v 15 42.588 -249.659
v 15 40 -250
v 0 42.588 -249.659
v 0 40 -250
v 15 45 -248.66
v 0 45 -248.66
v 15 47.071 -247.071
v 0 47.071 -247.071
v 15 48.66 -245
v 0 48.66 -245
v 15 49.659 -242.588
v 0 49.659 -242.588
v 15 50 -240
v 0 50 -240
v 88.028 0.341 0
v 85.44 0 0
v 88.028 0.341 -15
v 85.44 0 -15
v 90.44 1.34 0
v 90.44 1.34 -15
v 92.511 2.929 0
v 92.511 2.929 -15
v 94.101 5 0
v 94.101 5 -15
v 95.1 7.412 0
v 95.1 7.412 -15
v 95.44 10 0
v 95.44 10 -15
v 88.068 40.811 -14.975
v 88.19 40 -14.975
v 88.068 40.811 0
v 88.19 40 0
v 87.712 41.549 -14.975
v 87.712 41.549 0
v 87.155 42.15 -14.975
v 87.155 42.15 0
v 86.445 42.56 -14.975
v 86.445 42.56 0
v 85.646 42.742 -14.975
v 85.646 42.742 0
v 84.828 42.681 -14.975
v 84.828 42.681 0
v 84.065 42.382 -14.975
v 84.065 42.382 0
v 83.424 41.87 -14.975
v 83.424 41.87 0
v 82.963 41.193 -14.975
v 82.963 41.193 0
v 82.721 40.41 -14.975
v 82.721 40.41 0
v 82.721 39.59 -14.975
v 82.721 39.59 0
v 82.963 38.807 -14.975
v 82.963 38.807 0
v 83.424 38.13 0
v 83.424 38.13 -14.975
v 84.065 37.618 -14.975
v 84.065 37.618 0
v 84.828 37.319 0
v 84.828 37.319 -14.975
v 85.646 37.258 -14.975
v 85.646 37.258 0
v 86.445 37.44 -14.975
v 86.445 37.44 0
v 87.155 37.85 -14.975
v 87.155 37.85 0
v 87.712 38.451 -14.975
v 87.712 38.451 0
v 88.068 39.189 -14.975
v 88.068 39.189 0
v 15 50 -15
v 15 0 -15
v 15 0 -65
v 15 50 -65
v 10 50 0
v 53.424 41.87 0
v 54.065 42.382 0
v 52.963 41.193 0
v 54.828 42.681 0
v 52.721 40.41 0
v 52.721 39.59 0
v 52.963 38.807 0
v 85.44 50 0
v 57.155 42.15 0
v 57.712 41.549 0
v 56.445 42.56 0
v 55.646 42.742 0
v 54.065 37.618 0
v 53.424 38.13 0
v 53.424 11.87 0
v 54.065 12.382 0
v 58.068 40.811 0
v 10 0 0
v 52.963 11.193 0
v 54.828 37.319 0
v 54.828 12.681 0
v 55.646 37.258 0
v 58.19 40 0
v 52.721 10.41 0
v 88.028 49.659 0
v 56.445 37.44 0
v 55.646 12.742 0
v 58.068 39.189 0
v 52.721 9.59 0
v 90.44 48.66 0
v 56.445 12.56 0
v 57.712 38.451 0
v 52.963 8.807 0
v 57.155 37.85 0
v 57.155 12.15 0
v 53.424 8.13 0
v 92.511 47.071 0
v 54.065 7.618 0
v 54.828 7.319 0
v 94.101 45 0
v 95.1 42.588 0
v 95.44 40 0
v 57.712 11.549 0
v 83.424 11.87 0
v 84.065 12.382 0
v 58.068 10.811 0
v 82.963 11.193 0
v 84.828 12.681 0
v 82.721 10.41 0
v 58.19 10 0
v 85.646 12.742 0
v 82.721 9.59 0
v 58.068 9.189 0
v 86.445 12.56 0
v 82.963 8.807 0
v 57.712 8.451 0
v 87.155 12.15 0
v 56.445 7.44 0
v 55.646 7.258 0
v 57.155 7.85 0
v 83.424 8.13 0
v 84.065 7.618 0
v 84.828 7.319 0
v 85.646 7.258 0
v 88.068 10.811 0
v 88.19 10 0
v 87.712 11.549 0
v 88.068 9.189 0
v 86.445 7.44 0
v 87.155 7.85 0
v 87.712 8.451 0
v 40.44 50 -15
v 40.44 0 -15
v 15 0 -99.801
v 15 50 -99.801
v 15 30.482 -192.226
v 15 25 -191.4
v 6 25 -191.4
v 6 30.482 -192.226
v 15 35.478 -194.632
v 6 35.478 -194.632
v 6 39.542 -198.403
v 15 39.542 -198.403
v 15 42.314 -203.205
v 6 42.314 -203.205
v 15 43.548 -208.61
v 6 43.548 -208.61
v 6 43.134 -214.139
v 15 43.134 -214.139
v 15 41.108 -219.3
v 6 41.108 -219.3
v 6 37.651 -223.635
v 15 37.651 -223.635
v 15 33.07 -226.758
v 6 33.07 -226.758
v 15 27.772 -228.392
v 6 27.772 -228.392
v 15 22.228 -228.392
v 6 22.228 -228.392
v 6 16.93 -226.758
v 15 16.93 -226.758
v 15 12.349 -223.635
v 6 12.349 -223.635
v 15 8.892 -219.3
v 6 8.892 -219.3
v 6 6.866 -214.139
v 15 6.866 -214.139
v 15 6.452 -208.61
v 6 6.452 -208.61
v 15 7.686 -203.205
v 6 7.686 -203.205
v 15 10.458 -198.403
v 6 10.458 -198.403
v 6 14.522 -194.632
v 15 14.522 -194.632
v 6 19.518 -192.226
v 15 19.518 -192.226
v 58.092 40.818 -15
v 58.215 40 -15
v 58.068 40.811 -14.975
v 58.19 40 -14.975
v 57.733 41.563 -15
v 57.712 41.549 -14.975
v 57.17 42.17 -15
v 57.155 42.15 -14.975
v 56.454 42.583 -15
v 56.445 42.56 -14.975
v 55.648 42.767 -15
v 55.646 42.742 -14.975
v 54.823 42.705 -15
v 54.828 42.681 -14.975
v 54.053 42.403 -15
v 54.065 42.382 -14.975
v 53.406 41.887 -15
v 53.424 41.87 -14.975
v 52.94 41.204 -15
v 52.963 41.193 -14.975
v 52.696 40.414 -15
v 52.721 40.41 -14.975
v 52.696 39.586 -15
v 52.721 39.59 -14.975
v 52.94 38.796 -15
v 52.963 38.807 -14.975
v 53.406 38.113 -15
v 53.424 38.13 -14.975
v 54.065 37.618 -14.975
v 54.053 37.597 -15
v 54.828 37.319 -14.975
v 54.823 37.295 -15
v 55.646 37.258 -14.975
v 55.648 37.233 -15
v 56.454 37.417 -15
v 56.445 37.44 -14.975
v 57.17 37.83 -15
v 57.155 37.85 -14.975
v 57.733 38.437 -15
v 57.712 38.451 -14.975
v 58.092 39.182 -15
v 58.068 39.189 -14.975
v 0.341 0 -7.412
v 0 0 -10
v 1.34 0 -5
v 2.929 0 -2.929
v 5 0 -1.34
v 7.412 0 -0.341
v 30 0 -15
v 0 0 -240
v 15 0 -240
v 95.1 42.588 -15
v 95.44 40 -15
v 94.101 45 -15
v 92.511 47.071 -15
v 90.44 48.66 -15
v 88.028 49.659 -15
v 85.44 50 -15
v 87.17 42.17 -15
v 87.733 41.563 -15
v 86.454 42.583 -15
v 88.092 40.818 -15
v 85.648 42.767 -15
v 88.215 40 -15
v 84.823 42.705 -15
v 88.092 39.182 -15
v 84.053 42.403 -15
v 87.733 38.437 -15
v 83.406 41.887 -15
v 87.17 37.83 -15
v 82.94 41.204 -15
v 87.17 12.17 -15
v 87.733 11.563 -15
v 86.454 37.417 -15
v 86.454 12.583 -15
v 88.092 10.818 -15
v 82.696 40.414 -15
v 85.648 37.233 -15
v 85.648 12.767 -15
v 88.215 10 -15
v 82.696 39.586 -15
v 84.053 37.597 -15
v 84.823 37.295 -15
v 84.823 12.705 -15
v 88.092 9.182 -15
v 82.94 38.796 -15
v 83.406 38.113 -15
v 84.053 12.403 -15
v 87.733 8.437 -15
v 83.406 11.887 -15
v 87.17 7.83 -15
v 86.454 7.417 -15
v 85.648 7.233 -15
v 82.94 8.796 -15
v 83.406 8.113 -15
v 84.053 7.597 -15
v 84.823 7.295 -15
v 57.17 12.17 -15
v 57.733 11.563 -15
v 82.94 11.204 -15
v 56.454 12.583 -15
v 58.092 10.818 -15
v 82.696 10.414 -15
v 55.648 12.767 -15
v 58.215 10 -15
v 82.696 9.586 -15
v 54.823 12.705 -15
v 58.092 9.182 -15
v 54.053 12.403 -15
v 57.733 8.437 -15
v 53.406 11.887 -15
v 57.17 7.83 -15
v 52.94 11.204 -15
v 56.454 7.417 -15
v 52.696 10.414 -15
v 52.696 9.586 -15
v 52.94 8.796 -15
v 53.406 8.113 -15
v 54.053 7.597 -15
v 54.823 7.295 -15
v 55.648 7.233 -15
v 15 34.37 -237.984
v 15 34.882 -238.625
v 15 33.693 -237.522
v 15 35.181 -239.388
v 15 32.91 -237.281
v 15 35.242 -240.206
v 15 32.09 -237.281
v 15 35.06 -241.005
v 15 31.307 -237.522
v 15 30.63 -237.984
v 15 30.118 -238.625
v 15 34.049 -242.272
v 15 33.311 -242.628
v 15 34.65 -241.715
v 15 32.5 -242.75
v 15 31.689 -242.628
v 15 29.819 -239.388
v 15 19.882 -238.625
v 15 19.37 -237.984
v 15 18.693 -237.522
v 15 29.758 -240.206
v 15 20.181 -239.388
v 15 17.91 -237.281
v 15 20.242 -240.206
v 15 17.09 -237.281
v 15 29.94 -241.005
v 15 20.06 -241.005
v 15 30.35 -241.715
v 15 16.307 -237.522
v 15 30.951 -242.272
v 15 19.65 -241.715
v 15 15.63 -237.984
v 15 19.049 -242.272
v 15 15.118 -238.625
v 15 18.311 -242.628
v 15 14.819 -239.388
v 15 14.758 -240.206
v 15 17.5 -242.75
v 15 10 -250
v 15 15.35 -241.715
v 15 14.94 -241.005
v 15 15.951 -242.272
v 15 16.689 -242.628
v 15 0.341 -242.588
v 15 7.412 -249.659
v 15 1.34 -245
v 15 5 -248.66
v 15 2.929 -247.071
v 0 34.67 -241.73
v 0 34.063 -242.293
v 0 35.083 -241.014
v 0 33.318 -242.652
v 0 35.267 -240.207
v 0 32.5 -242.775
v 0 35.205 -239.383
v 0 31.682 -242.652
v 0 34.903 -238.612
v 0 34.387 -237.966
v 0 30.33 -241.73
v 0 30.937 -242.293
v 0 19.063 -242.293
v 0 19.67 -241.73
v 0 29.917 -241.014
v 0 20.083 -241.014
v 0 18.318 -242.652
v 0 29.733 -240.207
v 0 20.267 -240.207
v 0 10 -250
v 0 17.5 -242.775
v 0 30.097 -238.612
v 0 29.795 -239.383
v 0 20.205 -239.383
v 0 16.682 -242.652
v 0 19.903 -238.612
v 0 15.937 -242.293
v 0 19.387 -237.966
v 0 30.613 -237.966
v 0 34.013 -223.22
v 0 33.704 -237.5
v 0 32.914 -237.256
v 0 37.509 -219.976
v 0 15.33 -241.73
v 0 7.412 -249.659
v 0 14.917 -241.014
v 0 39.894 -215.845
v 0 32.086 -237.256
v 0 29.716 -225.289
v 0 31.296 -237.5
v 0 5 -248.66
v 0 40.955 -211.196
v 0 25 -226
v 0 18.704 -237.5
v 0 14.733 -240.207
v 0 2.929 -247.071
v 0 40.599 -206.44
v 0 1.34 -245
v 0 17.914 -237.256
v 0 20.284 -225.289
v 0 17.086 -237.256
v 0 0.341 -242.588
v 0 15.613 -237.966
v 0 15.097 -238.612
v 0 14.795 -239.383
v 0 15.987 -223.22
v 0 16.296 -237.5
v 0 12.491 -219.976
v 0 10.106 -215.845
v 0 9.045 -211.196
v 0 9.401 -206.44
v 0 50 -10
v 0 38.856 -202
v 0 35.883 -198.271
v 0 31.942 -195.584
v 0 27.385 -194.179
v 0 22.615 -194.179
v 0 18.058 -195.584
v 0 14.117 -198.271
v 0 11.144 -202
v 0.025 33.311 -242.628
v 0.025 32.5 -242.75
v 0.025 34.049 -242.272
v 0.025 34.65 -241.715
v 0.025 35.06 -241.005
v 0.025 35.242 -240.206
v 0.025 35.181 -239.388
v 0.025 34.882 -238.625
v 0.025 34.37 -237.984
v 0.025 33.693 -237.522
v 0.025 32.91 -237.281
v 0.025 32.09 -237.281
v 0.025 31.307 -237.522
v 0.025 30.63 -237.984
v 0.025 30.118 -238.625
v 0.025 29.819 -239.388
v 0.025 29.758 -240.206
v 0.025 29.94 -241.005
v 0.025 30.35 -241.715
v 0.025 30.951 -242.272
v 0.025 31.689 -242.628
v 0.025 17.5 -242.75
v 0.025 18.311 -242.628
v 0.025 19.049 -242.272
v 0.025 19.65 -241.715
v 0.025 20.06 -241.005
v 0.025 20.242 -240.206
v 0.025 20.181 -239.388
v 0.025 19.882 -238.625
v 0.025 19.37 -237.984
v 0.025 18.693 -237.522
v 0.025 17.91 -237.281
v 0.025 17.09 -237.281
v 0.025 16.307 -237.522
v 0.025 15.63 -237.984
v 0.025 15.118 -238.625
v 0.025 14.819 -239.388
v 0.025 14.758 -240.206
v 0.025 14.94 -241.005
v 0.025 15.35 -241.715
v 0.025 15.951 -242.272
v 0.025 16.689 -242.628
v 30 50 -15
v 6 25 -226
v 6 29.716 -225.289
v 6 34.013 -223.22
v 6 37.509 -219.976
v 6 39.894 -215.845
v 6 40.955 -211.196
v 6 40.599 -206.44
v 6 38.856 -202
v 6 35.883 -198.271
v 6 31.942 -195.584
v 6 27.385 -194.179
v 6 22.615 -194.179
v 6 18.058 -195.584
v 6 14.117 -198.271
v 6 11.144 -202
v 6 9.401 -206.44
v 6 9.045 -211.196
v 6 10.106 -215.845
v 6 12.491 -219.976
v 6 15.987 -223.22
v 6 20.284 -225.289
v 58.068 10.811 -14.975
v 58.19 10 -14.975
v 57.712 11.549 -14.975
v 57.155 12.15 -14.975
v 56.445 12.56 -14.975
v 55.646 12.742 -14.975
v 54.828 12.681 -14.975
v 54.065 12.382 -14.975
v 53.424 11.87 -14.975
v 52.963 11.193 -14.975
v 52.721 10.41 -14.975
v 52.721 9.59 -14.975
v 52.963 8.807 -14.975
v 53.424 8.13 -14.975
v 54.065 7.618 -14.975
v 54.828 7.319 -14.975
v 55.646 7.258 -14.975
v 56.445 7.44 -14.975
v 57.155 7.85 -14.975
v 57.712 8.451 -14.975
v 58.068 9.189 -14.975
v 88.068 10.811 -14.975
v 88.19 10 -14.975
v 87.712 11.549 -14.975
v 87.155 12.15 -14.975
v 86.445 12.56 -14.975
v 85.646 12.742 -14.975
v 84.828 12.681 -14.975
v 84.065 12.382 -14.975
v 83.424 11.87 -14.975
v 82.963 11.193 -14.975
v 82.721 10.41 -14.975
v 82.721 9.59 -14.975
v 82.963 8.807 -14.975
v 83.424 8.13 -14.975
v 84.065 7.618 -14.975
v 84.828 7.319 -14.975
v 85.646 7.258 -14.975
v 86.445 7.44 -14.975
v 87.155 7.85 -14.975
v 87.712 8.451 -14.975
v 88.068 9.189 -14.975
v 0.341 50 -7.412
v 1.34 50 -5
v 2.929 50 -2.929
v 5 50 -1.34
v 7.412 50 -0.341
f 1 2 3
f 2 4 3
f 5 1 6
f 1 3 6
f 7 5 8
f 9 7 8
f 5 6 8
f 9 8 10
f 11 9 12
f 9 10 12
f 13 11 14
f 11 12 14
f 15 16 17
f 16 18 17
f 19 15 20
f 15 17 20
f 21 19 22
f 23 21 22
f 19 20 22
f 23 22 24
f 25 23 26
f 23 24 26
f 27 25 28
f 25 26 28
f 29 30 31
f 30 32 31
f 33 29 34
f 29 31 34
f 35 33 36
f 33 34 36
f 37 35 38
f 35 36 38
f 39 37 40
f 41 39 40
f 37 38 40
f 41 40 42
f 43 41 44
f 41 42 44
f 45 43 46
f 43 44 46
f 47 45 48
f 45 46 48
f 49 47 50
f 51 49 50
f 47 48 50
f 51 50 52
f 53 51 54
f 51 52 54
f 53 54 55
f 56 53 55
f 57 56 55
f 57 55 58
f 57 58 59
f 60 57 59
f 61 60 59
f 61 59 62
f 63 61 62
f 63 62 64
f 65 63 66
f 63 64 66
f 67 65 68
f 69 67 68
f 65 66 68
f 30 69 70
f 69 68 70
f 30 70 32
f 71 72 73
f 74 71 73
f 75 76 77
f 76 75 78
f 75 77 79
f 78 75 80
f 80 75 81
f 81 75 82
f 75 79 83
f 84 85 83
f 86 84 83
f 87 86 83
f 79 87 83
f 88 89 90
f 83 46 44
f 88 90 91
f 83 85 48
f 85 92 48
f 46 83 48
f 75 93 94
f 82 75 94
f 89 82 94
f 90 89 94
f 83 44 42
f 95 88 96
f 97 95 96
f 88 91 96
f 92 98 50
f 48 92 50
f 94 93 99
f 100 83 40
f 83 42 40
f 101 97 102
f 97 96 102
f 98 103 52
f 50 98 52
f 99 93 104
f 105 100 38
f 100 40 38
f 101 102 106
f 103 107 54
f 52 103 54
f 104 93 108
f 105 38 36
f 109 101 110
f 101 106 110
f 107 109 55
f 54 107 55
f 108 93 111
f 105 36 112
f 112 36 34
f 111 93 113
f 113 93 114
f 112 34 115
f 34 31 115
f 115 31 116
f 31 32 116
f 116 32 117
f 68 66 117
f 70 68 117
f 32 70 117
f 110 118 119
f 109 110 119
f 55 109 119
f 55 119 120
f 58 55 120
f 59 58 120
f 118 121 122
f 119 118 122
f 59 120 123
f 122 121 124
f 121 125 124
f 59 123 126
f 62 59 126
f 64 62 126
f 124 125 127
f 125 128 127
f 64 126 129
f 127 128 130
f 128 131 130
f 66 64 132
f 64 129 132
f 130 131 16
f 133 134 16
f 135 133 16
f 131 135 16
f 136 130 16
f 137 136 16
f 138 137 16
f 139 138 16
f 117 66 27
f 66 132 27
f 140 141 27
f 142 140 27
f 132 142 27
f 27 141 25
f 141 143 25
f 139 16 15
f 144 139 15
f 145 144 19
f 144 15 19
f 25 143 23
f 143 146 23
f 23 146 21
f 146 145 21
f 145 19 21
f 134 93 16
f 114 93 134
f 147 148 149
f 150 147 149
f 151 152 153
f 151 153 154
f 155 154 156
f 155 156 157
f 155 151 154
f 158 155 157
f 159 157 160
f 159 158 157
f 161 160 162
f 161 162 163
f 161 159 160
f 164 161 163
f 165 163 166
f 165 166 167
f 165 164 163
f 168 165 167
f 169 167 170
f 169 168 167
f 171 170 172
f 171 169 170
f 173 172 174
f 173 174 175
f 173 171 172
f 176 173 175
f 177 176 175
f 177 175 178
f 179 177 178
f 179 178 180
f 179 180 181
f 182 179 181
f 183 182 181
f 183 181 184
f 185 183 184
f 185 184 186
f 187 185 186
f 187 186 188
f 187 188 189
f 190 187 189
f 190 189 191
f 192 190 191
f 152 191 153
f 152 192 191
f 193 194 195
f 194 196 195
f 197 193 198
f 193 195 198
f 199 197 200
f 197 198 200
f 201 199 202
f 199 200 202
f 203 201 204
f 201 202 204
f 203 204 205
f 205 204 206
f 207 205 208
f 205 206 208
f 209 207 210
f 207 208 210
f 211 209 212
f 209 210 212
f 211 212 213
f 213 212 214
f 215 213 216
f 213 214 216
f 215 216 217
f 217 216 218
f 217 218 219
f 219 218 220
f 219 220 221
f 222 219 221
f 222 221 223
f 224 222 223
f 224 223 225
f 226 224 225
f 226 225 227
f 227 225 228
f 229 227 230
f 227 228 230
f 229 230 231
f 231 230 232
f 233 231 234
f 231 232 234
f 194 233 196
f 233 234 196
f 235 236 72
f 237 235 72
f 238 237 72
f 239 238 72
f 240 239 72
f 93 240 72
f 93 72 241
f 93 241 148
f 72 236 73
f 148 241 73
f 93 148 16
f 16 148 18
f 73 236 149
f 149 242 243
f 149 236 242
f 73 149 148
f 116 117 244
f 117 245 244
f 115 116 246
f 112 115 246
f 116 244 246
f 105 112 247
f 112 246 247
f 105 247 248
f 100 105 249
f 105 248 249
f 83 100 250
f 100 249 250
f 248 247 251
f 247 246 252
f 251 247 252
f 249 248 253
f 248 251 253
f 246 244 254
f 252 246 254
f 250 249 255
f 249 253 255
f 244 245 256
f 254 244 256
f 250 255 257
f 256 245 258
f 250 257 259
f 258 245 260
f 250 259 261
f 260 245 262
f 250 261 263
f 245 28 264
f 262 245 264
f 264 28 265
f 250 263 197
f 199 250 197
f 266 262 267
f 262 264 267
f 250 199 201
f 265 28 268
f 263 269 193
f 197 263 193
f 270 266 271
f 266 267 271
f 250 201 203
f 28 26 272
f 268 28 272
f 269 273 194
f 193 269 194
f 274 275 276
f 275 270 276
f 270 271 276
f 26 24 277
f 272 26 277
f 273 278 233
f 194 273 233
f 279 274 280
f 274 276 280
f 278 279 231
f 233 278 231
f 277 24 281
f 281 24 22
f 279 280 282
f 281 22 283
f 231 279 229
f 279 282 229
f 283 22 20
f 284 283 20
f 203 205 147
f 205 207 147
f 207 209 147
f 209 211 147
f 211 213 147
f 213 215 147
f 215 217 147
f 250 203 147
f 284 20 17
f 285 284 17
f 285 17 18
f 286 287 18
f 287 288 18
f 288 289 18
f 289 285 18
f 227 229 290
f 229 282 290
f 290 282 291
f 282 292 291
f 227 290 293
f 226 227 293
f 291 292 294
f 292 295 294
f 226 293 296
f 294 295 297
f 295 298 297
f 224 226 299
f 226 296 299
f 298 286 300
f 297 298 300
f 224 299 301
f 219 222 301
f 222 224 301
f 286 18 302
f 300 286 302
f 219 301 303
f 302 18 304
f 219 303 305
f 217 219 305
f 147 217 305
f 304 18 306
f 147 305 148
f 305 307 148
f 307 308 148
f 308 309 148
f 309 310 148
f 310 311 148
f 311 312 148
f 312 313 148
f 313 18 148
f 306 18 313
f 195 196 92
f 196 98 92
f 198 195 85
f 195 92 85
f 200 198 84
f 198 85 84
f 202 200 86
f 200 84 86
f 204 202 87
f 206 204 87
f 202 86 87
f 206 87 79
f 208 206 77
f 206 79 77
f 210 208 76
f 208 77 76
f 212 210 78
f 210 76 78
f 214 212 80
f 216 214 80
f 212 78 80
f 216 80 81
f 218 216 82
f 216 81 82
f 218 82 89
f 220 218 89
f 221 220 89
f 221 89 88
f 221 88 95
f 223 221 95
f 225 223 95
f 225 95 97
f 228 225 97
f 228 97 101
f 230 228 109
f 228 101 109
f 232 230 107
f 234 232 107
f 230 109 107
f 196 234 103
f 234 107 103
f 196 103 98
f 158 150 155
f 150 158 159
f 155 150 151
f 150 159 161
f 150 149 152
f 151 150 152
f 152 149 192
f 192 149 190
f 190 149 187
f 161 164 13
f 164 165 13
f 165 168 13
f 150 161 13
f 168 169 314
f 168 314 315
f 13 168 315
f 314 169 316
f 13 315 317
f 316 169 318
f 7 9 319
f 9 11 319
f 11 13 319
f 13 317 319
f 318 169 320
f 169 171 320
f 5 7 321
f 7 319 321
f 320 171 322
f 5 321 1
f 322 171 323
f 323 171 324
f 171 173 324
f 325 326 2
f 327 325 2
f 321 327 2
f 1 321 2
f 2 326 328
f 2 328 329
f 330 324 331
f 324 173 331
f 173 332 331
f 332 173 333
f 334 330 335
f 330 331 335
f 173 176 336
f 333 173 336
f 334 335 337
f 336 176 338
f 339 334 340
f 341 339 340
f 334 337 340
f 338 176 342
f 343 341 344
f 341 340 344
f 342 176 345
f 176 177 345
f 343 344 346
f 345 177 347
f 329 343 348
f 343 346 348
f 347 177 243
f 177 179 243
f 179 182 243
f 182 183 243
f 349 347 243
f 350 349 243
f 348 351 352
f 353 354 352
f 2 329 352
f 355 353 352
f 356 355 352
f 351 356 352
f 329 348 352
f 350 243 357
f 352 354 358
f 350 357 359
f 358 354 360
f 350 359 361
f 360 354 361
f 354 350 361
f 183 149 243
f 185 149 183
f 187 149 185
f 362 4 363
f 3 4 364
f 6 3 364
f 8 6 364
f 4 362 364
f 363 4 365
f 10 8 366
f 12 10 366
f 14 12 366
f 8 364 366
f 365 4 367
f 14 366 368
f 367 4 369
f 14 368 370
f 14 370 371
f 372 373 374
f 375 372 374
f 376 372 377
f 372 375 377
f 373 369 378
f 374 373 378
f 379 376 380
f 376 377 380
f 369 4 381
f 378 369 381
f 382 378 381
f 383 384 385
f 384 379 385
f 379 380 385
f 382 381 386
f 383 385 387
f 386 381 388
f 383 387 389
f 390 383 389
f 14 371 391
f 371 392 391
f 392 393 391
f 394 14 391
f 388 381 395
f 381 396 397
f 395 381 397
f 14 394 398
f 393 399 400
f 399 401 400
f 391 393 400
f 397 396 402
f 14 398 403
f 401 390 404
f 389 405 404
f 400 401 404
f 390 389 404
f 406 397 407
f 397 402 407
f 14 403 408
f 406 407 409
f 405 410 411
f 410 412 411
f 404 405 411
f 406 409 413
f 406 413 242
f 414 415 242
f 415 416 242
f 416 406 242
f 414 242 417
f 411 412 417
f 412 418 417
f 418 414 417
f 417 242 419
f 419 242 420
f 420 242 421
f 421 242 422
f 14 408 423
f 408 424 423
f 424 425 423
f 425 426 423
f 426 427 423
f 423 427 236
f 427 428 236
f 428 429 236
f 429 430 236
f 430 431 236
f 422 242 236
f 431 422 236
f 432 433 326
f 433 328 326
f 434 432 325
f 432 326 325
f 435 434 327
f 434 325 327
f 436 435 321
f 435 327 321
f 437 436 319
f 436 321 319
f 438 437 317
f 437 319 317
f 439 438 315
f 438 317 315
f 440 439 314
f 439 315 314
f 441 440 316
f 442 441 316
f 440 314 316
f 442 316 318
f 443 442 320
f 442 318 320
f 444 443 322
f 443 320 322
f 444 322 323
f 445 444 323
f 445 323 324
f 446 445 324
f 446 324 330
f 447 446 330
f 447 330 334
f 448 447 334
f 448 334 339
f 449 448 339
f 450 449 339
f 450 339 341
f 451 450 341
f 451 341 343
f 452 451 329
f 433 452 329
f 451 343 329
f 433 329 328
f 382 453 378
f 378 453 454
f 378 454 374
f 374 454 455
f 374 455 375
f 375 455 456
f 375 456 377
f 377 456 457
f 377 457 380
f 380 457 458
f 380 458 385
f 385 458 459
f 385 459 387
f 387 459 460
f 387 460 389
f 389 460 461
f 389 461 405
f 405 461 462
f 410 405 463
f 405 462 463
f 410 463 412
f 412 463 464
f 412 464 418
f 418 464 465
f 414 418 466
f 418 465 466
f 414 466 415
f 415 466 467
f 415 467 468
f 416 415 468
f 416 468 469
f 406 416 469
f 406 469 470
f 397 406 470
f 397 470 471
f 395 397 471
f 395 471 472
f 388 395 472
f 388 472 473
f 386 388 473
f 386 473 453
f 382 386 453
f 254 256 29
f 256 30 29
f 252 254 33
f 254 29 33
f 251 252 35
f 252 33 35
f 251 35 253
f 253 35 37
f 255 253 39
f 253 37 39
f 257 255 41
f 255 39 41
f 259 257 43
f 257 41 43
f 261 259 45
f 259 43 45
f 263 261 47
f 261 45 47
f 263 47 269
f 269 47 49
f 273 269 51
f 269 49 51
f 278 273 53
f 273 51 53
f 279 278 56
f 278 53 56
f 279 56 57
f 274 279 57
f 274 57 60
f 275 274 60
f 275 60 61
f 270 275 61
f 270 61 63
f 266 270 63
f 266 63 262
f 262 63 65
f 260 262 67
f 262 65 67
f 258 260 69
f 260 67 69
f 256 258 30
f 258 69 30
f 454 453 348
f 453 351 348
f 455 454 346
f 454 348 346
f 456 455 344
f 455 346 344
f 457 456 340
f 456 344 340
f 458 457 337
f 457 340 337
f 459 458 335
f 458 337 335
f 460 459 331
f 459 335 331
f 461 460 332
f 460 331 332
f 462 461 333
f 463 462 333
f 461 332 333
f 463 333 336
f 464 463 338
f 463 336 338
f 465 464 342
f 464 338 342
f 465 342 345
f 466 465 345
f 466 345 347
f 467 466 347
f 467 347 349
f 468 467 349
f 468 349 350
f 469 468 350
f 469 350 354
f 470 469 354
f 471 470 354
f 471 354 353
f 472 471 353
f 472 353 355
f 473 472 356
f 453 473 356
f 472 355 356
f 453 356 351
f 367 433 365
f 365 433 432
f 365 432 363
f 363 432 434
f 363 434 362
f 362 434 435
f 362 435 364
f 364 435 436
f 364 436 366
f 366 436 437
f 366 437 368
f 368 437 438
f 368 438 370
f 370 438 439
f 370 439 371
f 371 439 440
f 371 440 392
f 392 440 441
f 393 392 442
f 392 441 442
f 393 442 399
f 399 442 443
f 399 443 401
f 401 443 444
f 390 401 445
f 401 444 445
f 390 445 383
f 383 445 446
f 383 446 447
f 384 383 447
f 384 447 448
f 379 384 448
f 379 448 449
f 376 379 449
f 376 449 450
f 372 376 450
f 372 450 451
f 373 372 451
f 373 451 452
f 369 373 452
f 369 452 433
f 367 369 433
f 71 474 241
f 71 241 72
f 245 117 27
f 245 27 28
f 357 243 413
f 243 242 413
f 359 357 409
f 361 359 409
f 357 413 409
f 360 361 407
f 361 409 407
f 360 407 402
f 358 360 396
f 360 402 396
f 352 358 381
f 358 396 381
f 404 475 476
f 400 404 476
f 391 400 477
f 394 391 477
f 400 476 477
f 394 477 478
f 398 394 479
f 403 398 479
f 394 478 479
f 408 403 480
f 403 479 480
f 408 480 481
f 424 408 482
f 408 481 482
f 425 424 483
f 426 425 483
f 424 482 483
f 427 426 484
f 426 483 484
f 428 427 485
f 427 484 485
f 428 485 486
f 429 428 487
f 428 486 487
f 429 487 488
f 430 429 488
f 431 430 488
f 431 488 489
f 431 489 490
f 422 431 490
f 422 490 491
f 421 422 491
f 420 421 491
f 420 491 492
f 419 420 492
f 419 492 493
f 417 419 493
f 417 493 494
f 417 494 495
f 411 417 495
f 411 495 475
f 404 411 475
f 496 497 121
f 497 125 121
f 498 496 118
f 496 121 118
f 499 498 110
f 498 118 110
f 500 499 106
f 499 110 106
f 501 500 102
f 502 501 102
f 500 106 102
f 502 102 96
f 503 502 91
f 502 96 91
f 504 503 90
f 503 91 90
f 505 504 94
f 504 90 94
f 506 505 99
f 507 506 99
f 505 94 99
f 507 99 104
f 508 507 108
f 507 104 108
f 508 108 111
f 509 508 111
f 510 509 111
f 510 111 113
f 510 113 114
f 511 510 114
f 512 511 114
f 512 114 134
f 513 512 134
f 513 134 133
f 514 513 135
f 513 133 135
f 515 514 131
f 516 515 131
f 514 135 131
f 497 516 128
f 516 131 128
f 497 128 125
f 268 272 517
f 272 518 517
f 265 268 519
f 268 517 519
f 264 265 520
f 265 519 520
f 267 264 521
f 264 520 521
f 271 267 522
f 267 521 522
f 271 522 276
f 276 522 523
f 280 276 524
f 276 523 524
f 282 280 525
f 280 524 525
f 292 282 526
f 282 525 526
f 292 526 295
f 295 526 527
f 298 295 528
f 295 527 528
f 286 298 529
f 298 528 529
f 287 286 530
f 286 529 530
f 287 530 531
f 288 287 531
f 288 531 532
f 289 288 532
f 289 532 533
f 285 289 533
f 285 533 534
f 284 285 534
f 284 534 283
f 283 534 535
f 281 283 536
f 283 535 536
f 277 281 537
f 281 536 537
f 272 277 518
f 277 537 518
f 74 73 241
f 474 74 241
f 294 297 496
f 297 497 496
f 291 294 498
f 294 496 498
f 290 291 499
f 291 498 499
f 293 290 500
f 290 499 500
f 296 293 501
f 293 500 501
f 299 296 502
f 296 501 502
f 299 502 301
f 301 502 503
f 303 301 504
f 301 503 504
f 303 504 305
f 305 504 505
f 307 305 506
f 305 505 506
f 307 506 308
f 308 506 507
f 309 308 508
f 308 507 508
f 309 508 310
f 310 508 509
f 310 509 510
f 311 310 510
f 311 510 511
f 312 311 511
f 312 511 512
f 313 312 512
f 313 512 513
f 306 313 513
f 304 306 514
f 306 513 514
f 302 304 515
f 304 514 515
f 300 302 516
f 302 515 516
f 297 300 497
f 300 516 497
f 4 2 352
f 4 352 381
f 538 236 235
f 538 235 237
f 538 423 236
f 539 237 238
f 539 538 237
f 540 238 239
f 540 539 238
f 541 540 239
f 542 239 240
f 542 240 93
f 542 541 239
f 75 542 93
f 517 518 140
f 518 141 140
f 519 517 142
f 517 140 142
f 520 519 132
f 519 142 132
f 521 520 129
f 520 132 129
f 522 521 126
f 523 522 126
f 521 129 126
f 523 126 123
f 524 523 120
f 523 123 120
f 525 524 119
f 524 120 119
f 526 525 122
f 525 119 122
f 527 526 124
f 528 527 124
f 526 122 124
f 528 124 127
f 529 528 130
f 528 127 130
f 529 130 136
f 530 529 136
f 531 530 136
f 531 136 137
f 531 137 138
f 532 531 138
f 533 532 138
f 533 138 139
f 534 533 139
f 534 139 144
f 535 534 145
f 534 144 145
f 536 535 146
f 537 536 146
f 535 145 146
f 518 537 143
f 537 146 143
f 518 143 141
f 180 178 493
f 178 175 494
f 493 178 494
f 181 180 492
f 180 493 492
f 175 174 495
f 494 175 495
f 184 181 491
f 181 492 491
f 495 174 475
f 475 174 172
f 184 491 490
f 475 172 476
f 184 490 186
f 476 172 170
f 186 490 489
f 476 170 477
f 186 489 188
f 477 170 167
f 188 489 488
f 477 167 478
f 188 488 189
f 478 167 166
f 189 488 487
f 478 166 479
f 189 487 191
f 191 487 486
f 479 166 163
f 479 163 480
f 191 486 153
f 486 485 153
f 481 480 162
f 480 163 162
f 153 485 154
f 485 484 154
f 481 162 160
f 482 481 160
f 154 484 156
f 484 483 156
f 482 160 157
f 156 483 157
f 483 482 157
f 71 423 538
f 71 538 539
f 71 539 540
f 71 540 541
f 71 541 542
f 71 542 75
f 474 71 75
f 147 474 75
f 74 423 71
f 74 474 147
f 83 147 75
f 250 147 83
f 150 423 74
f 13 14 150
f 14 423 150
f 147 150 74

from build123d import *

# Parameters (mm, degrees)
BOSS_EXTRUDE1_DEPTH            = 50
SKETCH7_R                      = 16
CUT_EXTRUDE2_DEPTH             = 268.339938863
SKETCH8_R                      = 18.6
CUT_EXTRUDE3_DEPTH             = 9
FILLET2_R                      = 10
M5_CLEARANCE_HOLE2_D           = 5.5
M5_CLEARANCE_HOLE2_CSINK_D     = 5.55
M5_CLEARANCE_HOLE2_CSINK_ANGLE = 90
FILLET1_R                      = 10


# Read off the part's stored shape, not the designer's step: M5 Clearance Hole3
with BuildPart() as part:
    # Sketch1 → Boss-Extrude1 (new body)
    with BuildSketch(Plane(origin=(0, 0, 0), x_dir=(1, 0, 0), z_dir=(0, 1, 0))):
        Polygon((15, 15), (15, 250), (0, 250), (0, 0), (95.440306509, 0), (95.440306509, 15), align=None)
        Polygon((40.440306509, 15), (15, 99.801021696), (15, 65), (30, 15), align=None)
    extrude(amount=BOSS_EXTRUDE1_DEPTH)

    # Sketch7 → Cut-Extrude2 (cut, through all)
    with BuildSketch(Plane(origin=(15, 0, 0), x_dir=(0, 0, -1), z_dir=(1, 0, 0))):
        with Locations((210, 25)):
            Circle(SKETCH7_R)
    extrude(amount=-CUT_EXTRUDE2_DEPTH, mode=Mode.SUBTRACT)

    # Sketch8 → Cut-Extrude3 (cut)
    with BuildSketch(Plane.ZY.offset(-15)):
        with Locations((-210, 25)):
            Circle(SKETCH8_R)
    extrude(amount=CUT_EXTRUDE3_DEPTH, mode=Mode.SUBTRACT)

    # Fillet2
    fillet2_edges = [part.edges().sort_by_distance(p)[0] for p in [
        (0, 25, 0),
    ]]
    fillet(fillet2_edges, radius=FILLET2_R)

    # M5 Clearance Hole2 (through all)
    with Locations(Plane.ZY):
        with Locations((-240, 32.5), (-240, 17.5)):
            CounterSinkHole(M5_CLEARANCE_HOLE2_D / 2, M5_CLEARANCE_HOLE2_CSINK_D / 2, counter_sink_angle=M5_CLEARANCE_HOLE2_CSINK_ANGLE)

    # M5 Clearance Hole3 outline → M5 Clearance Hole3 (revolve, cut)
    with BuildSketch(Plane(origin=(55.440306509, 40, 0), x_dir=(1, 0, 0), z_dir=(0, -1, 0))):
        Polygon((2.75, -14.975), (2.75, 0), (0, 0), (0, -15), (2.775, -15), align=None)
    revolve(axis=Axis((55.440306509, 40, 0), (0, 0, 1)), mode=Mode.SUBTRACT)

    # M5 Clearance Hole3 2 outline → M5 Clearance Hole3 2 (revolve, cut)
    with BuildSketch(Plane(origin=(85.440306509, 10, 0), x_dir=(1, 0, 0), z_dir=(0, -1, 0))):
        Polygon((2.75, -14.975), (2.75, 0), (0, 0), (0, -15), (2.775, -15), align=None)
    revolve(axis=Axis((85.440306509, 10, 0), (0, 0, 1)), mode=Mode.SUBTRACT)

    # M5 Clearance Hole3 3 outline → M5 Clearance Hole3 3 (revolve, cut)
    with BuildSketch(Plane(origin=(55.440306509, 10, 0), x_dir=(1, 0, 0), z_dir=(0, -1, 0))):
        Polygon((2.75, -14.975), (2.75, 0), (0, 0), (0, -15), (2.775, -15), align=None)
    revolve(axis=Axis((55.440306509, 10, 0), (0, 0, 1)), mode=Mode.SUBTRACT)

    # M5 Clearance Hole3 4 outline → M5 Clearance Hole3 4 (revolve, cut)
    with BuildSketch(Plane(origin=(85.440306509, 40, 0), x_dir=(1, 0, 0), z_dir=(0, -1, 0))):
        Polygon((2.75, -14.975), (2.75, 0), (0, 0), (0, -15), (2.775, -15), align=None)
    revolve(axis=Axis((85.440306509, 40, 0), (0, 0, 1)), mode=Mode.SUBTRACT)

    # Fillet1
    fillet1_edges = [part.edges().sort_by_distance(p)[0] for p in [
        (95.440306509, 0, -7.5),
        (7.5, 0, -250),
        (7.5, 50, -250),
        (95.440306509, 50, -7.5),
    ]]
    fillet(fillet1_edges, radius=FILLET1_R)


solid = part.part
